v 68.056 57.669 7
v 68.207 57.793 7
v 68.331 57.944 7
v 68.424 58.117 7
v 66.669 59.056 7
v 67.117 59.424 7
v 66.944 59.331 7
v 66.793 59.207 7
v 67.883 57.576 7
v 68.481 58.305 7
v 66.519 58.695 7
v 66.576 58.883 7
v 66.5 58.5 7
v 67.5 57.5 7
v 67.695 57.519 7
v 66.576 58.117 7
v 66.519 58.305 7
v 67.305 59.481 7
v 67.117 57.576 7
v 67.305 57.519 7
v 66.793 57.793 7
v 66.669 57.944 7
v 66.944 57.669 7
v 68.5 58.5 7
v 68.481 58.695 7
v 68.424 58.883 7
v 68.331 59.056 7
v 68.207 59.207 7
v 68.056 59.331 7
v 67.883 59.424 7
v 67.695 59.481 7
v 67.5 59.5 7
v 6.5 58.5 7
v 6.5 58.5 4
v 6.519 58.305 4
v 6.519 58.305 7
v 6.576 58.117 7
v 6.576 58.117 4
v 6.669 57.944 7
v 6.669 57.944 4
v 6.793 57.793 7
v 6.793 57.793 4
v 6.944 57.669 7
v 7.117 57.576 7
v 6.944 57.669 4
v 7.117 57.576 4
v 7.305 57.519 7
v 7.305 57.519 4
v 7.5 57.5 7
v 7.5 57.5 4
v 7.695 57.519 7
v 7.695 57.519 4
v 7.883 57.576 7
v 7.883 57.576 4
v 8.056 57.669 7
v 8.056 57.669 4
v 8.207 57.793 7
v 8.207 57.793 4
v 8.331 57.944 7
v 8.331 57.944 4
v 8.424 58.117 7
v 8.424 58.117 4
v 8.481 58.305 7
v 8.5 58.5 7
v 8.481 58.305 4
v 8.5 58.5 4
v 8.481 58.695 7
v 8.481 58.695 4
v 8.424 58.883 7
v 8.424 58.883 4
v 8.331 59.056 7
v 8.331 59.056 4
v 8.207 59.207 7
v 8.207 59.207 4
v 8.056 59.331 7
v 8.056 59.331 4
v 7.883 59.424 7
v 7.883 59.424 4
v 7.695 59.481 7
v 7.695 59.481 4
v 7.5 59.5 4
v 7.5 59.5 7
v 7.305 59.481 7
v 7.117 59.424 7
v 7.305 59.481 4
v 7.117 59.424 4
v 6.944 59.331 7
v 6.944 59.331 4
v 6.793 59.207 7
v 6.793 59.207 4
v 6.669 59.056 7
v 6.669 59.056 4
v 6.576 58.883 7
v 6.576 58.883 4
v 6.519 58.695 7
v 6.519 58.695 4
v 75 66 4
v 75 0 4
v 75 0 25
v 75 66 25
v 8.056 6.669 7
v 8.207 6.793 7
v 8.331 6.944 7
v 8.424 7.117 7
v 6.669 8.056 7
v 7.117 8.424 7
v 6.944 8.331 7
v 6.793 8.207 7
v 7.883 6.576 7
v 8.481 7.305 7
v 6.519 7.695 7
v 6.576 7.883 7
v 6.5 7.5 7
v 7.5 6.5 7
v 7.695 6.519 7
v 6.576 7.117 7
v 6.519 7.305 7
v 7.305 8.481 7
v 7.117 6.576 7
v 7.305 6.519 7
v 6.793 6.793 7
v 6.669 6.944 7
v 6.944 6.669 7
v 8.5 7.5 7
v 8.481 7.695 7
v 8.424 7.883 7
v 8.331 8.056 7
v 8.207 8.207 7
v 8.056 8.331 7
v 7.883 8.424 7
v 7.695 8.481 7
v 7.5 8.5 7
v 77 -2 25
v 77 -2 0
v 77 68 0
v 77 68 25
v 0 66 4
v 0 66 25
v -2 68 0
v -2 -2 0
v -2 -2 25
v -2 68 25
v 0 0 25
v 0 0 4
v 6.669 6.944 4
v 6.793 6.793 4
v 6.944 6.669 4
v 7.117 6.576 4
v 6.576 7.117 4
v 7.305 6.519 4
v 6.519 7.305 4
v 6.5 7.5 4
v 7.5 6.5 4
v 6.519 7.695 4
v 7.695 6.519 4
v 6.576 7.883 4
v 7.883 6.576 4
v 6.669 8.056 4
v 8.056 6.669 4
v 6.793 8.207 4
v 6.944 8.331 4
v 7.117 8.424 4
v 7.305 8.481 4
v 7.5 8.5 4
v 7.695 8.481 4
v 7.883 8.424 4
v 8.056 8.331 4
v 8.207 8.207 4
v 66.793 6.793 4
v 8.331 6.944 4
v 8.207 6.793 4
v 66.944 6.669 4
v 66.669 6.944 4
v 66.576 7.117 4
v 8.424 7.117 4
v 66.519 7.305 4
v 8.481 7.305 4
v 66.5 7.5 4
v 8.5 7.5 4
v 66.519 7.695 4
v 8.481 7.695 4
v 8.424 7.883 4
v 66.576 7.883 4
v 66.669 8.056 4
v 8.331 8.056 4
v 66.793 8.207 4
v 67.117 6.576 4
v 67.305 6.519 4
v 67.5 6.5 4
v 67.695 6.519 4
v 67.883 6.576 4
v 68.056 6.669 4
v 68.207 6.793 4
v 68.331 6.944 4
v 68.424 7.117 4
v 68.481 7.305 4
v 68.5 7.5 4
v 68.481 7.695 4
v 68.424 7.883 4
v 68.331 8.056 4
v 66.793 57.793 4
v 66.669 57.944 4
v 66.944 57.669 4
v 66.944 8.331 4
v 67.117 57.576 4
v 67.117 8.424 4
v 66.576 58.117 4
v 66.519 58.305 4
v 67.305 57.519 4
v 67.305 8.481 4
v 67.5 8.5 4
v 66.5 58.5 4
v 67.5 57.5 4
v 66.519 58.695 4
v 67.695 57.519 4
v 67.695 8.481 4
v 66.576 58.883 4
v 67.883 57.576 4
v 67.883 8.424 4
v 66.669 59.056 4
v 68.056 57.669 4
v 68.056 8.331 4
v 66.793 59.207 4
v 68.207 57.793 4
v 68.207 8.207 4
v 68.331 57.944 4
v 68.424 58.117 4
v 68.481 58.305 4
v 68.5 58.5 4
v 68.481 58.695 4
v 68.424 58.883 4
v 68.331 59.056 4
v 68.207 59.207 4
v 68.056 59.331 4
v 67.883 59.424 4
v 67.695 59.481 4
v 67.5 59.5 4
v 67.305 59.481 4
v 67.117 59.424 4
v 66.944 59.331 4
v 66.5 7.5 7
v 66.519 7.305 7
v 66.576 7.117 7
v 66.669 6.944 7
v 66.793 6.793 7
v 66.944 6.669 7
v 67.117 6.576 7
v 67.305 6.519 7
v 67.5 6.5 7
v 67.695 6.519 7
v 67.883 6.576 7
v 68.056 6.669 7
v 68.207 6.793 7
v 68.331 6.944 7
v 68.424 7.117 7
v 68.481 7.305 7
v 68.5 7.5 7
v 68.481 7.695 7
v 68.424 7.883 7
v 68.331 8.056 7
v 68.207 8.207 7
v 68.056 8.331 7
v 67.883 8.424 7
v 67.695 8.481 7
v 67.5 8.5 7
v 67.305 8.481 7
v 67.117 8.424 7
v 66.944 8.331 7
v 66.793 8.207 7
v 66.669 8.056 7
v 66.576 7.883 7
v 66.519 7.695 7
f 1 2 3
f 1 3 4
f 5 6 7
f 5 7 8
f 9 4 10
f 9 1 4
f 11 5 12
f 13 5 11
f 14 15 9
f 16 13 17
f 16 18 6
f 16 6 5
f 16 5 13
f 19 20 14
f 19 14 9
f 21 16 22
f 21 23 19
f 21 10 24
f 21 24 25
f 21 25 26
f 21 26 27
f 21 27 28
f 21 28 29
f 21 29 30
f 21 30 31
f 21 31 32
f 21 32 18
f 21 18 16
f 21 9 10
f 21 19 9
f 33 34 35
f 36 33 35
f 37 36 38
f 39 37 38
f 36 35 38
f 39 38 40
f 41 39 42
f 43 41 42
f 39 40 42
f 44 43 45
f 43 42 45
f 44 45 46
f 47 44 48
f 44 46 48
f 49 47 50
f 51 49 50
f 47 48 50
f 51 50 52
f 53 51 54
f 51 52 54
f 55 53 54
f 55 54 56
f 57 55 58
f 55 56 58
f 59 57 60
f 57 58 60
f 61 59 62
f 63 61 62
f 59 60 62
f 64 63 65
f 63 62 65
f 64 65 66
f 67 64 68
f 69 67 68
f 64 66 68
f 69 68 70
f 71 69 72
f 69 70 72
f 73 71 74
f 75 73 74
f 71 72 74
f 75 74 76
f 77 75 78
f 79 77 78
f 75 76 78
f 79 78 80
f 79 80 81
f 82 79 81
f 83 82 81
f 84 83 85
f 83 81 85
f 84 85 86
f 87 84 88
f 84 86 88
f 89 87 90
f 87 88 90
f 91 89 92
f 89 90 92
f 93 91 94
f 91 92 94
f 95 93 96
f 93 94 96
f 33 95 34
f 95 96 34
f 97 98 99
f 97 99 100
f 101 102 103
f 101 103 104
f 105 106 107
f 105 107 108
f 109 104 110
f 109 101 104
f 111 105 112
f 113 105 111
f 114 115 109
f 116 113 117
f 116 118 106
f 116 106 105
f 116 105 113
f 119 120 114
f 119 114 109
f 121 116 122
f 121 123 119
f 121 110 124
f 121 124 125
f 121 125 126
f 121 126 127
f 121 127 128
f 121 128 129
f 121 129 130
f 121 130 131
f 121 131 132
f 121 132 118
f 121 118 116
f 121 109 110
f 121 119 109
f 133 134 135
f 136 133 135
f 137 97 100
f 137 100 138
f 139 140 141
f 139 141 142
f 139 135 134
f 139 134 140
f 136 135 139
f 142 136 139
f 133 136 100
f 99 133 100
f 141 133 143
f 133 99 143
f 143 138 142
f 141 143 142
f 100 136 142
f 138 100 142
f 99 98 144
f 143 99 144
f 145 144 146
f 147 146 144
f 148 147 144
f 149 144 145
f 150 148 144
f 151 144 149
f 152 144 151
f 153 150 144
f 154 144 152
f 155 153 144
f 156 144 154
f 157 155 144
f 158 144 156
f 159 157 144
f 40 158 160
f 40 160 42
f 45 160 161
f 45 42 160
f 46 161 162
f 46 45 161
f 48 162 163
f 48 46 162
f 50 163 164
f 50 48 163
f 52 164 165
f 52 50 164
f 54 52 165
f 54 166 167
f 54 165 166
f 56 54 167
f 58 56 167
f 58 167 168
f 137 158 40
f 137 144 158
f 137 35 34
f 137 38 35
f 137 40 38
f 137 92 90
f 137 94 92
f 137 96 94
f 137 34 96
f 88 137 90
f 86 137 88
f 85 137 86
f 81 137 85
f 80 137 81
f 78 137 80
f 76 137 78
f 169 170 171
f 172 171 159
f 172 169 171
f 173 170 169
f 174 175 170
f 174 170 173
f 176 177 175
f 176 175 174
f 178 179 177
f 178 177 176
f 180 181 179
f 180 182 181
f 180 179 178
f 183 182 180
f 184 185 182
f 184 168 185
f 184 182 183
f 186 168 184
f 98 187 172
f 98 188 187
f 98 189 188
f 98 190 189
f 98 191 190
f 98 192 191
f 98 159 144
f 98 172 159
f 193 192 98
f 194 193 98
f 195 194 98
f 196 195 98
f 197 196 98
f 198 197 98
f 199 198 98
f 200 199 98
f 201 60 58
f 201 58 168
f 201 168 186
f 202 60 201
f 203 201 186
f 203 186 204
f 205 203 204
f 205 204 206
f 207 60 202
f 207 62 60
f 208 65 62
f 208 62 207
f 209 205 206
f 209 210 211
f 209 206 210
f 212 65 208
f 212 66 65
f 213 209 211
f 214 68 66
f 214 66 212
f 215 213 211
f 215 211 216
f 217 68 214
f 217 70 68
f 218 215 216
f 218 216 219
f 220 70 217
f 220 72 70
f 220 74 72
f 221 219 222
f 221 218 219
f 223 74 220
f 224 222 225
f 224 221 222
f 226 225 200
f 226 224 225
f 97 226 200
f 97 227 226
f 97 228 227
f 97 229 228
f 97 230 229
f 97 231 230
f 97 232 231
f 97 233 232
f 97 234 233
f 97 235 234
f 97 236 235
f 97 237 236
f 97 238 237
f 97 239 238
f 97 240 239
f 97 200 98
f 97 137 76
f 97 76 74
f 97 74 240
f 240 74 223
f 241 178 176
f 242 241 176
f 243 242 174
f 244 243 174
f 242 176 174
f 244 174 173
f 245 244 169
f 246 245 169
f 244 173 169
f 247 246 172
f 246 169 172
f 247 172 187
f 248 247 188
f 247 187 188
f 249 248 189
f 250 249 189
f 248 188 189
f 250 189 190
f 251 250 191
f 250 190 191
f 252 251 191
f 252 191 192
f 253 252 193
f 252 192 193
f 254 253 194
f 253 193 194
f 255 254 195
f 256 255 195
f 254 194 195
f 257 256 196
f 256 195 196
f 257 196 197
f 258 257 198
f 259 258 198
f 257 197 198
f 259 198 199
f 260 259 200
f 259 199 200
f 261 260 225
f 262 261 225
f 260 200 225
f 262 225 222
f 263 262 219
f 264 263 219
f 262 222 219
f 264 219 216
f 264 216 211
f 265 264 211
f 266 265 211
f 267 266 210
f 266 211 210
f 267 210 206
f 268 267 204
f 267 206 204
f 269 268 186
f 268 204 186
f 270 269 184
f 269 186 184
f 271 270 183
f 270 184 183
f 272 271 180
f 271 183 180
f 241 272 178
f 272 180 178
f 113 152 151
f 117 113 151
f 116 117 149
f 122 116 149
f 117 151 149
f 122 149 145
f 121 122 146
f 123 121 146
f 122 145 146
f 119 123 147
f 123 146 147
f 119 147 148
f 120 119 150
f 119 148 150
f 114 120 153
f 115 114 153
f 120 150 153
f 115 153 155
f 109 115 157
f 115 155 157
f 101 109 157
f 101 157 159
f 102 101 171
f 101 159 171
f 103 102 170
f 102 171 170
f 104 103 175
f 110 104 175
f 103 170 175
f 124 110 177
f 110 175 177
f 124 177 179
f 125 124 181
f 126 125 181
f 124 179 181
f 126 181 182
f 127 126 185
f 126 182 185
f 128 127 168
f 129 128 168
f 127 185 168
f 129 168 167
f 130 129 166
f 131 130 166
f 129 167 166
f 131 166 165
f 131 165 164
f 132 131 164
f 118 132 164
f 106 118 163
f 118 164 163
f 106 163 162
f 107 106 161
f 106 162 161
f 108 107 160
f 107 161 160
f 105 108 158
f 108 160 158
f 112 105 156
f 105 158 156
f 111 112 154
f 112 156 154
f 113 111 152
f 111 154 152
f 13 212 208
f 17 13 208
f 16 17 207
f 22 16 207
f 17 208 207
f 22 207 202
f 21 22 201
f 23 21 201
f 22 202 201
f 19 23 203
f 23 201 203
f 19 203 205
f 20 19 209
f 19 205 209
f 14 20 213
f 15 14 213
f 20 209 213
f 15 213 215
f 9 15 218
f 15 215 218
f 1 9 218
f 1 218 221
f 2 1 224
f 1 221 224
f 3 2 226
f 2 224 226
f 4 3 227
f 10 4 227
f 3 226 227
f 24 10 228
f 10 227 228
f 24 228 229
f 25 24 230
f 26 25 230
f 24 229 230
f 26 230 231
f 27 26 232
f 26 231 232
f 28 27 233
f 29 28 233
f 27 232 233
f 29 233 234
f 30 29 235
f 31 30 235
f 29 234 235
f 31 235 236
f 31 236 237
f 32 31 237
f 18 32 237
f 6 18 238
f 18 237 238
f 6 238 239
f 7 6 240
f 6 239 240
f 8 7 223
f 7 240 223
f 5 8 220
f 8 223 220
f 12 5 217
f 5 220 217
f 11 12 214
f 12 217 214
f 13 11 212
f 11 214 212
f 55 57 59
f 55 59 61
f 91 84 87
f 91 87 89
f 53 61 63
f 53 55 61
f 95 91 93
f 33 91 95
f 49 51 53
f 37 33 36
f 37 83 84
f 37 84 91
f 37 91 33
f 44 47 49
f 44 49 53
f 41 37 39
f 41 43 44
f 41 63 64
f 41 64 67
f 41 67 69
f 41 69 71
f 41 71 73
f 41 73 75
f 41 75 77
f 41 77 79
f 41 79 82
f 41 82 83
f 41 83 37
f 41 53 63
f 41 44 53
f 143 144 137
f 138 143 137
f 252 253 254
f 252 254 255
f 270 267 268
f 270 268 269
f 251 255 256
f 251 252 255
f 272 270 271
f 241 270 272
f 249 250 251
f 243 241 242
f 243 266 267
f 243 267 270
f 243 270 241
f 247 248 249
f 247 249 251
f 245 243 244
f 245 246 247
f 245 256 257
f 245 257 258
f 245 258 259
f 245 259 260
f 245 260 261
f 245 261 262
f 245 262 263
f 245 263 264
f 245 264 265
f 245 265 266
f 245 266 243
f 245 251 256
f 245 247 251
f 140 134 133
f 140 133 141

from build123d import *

# Parameters (mm, degrees)
ESQUISSE1_W        = 75
ESQUISSE1_H        = 66
BOSS_EXTRU_1_DEPTH = 4
ESQUISSE2_R        = 1
BOSS_EXTRU_2_DEPTH = 3
ESQUISSE3_W        = 79
ESQUISSE3_H        = 70
ESQUISSE3_W_2      = 75
ESQUISSE3_H_2      = 66
BOSS_EXTRU_3_DEPTH = 25


with BuildPart() as part:
    # Esquisse1 → Boss.-Extru.1 (new body)
    with BuildSketch(Plane.XY):
        with Locations((37.5, 33)):
            Rectangle(ESQUISSE1_W, ESQUISSE1_H)
    extrude(amount=BOSS_EXTRU_1_DEPTH)

    # Esquisse2 → Boss.-Extru.2 (add)
    with BuildSketch(Plane.XY.offset(4)):
        with Locations(Location((67.5, 7.5, 0), (0, 0, 180))):
            Circle(ESQUISSE2_R)
        with Locations(Location((67.5, 58.5, 0), (0, 0, 180))):
            Circle(ESQUISSE2_R)
        with Locations(Location((7.5, 58.5, 0), (0, 0, 180))):
            Circle(ESQUISSE2_R)
        with Locations(Location((7.5, 7.5, 0), (0, 0, 180))):
            Circle(ESQUISSE2_R)
    extrude(amount=BOSS_EXTRU_2_DEPTH)

    # Esquisse3 → Boss.-Extru.3 (add)
    with BuildSketch(Plane(origin=(0, 0, 0), x_dir=(-1, 0, 0), z_dir=(0, 0, -1))):
        with Locations((-37.5, 33)):
            Rectangle(ESQUISSE3_W, ESQUISSE3_H)
        with Locations((-37.5, 33)):
            Rectangle(ESQUISSE3_W_2, ESQUISSE3_H_2, mode=Mode.SUBTRACT)
    extrude(amount=-BOSS_EXTRU_3_DEPTH)


solid = part.part
